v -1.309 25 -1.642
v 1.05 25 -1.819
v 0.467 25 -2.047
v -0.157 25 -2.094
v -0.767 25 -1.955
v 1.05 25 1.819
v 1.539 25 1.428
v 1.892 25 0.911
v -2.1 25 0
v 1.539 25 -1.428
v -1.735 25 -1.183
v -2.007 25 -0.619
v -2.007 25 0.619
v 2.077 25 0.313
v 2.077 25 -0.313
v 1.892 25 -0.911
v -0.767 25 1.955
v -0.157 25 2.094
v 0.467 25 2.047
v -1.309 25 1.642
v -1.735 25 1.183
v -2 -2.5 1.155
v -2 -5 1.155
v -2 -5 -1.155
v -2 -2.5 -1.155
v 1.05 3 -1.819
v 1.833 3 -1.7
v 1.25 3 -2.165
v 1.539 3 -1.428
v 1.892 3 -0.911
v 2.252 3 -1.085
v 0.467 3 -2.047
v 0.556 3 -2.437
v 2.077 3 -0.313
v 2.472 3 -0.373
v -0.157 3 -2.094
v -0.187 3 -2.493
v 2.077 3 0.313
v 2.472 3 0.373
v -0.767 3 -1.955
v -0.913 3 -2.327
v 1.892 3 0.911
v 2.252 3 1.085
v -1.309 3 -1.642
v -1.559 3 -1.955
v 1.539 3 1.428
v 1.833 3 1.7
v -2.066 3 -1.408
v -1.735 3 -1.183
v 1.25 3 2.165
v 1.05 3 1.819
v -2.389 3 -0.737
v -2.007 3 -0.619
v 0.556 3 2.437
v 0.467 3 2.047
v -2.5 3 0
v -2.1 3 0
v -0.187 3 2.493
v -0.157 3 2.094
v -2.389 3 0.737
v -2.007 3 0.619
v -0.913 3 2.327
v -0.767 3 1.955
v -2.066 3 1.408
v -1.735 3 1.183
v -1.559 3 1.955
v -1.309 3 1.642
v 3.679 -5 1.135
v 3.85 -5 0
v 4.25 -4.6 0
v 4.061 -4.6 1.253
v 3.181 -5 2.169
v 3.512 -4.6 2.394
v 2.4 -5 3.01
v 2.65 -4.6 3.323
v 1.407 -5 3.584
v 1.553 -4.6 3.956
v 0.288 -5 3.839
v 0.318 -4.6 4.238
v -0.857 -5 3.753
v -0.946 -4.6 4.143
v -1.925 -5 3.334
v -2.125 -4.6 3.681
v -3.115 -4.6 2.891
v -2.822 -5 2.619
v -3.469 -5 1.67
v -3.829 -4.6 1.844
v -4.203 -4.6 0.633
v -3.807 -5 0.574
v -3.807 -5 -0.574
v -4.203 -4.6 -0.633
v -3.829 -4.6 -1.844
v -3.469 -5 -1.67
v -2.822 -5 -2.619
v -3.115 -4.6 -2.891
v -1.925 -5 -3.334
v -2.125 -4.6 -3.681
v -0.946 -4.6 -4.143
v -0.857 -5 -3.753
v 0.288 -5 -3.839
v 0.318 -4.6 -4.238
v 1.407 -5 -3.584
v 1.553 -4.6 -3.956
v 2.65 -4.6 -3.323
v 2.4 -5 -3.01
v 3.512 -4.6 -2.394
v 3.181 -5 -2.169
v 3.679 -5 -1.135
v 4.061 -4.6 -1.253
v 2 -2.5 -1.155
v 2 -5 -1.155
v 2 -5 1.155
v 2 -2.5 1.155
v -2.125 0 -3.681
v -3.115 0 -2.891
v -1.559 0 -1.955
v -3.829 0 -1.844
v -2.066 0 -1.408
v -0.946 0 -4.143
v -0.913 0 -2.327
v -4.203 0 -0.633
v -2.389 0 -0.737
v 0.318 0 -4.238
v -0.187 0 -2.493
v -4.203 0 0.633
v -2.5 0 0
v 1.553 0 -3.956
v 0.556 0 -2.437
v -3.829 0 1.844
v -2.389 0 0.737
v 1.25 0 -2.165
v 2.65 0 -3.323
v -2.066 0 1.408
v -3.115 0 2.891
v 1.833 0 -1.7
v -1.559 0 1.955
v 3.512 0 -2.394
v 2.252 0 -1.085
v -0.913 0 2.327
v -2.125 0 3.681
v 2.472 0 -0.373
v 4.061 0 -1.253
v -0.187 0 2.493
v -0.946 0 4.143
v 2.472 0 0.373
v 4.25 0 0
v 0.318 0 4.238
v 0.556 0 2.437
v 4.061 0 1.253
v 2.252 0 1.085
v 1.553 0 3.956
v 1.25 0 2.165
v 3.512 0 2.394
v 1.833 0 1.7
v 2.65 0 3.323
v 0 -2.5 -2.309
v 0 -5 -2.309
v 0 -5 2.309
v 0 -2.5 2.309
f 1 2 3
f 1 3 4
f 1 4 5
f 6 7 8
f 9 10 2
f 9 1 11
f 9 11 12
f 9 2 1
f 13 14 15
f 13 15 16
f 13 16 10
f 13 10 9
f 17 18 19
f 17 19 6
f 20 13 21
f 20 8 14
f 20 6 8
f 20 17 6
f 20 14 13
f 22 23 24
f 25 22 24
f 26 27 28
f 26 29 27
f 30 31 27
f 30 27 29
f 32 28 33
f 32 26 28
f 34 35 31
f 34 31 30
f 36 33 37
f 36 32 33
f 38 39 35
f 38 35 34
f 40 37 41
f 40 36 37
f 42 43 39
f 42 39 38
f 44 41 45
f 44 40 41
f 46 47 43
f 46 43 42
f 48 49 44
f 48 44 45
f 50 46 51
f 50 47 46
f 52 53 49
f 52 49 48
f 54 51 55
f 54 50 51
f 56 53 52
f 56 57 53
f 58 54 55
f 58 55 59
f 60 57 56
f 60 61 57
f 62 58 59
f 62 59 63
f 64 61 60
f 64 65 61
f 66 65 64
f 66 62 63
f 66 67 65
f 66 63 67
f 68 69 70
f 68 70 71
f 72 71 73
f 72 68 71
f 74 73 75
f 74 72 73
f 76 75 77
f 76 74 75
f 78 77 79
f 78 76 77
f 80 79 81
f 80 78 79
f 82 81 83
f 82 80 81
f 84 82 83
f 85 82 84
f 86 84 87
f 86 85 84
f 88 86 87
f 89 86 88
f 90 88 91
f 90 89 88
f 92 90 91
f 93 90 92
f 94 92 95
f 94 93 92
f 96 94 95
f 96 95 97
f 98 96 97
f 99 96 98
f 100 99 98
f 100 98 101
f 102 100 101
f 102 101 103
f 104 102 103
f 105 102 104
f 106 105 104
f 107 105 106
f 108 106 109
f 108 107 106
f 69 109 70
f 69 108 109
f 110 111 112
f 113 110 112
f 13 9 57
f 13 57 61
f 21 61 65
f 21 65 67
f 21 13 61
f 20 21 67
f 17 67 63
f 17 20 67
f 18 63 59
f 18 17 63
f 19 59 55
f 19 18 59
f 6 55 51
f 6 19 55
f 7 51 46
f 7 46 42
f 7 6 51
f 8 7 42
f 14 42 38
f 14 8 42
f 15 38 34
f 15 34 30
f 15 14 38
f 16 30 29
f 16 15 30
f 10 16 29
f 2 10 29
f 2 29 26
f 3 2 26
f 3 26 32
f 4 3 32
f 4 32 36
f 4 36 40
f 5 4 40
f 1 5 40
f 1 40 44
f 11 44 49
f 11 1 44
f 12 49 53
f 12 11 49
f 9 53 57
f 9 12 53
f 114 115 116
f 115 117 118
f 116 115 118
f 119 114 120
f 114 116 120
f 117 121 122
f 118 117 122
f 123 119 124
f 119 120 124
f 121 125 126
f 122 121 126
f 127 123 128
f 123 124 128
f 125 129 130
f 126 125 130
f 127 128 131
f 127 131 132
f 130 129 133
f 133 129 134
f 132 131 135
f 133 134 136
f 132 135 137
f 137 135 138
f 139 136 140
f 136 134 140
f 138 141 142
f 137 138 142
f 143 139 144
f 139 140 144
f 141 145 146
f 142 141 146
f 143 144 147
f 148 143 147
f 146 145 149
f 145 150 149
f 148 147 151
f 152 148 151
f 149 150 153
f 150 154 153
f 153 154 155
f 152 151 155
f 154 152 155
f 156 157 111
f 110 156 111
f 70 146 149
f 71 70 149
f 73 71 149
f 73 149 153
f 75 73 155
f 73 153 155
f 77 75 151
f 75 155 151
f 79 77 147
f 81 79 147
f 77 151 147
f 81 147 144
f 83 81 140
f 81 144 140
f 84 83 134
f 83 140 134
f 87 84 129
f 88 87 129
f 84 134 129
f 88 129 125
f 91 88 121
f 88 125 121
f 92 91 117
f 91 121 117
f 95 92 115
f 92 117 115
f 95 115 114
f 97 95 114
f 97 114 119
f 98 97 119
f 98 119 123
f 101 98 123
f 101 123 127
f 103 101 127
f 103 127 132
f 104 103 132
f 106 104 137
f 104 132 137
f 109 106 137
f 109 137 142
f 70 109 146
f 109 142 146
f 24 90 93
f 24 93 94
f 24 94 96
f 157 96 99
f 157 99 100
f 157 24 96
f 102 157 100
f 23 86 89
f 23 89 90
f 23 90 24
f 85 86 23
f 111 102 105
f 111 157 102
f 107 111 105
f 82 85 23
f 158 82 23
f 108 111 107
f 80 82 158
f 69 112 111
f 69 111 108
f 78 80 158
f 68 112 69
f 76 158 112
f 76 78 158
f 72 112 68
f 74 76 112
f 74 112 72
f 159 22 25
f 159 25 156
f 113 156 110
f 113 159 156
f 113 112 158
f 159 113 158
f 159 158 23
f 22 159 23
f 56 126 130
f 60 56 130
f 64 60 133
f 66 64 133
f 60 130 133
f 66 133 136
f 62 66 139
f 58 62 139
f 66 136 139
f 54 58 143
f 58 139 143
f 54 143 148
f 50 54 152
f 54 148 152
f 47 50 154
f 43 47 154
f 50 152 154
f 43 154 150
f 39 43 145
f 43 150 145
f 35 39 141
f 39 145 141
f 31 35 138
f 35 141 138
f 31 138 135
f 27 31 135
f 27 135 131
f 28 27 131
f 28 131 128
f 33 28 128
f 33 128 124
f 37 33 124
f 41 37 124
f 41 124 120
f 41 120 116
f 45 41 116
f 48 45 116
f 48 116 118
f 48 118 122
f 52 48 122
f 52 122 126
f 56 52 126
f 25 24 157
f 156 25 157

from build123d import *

# Parameters (mm, degrees)
F0_R     = 4.25
F1_DEPTH = 5
F2_R     = 2.5
F3_DEPTH = 25
F4_R     = 2.5
F4_R_2   = 2.1
F5_DEPTH = 22
F7_DEPTH = 2.5
F8_SIZE  = 0.4


with BuildPart() as f1:
    # F0 (on Front) → F1 (new body)
    with BuildSketch(Plane.XZ):
        Circle(F0_R)
    extrude(amount=F1_DEPTH)

    # F2 (on face) → F3 (join)
    with BuildSketch(Plane(origin=(0, 0, 0), x_dir=(-1, 0, 0), z_dir=(0, 1, 0))):
        Circle(F2_R)
    extrude(amount=F3_DEPTH)

    # F4 (on face) → F5 (cut)
    with BuildSketch(Plane(origin=(0, 25, 0), x_dir=(-1, 0, 0), z_dir=(0, 1, 0))):
        Circle(F4_R)
        Circle(F4_R_2, mode=Mode.SUBTRACT)
    extrude(amount=-F5_DEPTH, mode=Mode.SUBTRACT)

    # F6 (on face) → F7 (cut)
    with BuildSketch(Plane.XZ.offset(5)):
        Polygon((0, -2.309401), (2, -1.154701), (2, 1.154701), (0, 2.309401), (-2, 1.154701), (-2, -1.154701), align=None)
    extrude(amount=-F7_DEPTH, mode=Mode.SUBTRACT)

    # F8
    f8_edges = [f1.edges().sort_by_distance(p)[0] for p in [
        (-4.25, -5, 0),
    ]]
    chamfer(f8_edges, length=F8_SIZE)


solid = f1.part
